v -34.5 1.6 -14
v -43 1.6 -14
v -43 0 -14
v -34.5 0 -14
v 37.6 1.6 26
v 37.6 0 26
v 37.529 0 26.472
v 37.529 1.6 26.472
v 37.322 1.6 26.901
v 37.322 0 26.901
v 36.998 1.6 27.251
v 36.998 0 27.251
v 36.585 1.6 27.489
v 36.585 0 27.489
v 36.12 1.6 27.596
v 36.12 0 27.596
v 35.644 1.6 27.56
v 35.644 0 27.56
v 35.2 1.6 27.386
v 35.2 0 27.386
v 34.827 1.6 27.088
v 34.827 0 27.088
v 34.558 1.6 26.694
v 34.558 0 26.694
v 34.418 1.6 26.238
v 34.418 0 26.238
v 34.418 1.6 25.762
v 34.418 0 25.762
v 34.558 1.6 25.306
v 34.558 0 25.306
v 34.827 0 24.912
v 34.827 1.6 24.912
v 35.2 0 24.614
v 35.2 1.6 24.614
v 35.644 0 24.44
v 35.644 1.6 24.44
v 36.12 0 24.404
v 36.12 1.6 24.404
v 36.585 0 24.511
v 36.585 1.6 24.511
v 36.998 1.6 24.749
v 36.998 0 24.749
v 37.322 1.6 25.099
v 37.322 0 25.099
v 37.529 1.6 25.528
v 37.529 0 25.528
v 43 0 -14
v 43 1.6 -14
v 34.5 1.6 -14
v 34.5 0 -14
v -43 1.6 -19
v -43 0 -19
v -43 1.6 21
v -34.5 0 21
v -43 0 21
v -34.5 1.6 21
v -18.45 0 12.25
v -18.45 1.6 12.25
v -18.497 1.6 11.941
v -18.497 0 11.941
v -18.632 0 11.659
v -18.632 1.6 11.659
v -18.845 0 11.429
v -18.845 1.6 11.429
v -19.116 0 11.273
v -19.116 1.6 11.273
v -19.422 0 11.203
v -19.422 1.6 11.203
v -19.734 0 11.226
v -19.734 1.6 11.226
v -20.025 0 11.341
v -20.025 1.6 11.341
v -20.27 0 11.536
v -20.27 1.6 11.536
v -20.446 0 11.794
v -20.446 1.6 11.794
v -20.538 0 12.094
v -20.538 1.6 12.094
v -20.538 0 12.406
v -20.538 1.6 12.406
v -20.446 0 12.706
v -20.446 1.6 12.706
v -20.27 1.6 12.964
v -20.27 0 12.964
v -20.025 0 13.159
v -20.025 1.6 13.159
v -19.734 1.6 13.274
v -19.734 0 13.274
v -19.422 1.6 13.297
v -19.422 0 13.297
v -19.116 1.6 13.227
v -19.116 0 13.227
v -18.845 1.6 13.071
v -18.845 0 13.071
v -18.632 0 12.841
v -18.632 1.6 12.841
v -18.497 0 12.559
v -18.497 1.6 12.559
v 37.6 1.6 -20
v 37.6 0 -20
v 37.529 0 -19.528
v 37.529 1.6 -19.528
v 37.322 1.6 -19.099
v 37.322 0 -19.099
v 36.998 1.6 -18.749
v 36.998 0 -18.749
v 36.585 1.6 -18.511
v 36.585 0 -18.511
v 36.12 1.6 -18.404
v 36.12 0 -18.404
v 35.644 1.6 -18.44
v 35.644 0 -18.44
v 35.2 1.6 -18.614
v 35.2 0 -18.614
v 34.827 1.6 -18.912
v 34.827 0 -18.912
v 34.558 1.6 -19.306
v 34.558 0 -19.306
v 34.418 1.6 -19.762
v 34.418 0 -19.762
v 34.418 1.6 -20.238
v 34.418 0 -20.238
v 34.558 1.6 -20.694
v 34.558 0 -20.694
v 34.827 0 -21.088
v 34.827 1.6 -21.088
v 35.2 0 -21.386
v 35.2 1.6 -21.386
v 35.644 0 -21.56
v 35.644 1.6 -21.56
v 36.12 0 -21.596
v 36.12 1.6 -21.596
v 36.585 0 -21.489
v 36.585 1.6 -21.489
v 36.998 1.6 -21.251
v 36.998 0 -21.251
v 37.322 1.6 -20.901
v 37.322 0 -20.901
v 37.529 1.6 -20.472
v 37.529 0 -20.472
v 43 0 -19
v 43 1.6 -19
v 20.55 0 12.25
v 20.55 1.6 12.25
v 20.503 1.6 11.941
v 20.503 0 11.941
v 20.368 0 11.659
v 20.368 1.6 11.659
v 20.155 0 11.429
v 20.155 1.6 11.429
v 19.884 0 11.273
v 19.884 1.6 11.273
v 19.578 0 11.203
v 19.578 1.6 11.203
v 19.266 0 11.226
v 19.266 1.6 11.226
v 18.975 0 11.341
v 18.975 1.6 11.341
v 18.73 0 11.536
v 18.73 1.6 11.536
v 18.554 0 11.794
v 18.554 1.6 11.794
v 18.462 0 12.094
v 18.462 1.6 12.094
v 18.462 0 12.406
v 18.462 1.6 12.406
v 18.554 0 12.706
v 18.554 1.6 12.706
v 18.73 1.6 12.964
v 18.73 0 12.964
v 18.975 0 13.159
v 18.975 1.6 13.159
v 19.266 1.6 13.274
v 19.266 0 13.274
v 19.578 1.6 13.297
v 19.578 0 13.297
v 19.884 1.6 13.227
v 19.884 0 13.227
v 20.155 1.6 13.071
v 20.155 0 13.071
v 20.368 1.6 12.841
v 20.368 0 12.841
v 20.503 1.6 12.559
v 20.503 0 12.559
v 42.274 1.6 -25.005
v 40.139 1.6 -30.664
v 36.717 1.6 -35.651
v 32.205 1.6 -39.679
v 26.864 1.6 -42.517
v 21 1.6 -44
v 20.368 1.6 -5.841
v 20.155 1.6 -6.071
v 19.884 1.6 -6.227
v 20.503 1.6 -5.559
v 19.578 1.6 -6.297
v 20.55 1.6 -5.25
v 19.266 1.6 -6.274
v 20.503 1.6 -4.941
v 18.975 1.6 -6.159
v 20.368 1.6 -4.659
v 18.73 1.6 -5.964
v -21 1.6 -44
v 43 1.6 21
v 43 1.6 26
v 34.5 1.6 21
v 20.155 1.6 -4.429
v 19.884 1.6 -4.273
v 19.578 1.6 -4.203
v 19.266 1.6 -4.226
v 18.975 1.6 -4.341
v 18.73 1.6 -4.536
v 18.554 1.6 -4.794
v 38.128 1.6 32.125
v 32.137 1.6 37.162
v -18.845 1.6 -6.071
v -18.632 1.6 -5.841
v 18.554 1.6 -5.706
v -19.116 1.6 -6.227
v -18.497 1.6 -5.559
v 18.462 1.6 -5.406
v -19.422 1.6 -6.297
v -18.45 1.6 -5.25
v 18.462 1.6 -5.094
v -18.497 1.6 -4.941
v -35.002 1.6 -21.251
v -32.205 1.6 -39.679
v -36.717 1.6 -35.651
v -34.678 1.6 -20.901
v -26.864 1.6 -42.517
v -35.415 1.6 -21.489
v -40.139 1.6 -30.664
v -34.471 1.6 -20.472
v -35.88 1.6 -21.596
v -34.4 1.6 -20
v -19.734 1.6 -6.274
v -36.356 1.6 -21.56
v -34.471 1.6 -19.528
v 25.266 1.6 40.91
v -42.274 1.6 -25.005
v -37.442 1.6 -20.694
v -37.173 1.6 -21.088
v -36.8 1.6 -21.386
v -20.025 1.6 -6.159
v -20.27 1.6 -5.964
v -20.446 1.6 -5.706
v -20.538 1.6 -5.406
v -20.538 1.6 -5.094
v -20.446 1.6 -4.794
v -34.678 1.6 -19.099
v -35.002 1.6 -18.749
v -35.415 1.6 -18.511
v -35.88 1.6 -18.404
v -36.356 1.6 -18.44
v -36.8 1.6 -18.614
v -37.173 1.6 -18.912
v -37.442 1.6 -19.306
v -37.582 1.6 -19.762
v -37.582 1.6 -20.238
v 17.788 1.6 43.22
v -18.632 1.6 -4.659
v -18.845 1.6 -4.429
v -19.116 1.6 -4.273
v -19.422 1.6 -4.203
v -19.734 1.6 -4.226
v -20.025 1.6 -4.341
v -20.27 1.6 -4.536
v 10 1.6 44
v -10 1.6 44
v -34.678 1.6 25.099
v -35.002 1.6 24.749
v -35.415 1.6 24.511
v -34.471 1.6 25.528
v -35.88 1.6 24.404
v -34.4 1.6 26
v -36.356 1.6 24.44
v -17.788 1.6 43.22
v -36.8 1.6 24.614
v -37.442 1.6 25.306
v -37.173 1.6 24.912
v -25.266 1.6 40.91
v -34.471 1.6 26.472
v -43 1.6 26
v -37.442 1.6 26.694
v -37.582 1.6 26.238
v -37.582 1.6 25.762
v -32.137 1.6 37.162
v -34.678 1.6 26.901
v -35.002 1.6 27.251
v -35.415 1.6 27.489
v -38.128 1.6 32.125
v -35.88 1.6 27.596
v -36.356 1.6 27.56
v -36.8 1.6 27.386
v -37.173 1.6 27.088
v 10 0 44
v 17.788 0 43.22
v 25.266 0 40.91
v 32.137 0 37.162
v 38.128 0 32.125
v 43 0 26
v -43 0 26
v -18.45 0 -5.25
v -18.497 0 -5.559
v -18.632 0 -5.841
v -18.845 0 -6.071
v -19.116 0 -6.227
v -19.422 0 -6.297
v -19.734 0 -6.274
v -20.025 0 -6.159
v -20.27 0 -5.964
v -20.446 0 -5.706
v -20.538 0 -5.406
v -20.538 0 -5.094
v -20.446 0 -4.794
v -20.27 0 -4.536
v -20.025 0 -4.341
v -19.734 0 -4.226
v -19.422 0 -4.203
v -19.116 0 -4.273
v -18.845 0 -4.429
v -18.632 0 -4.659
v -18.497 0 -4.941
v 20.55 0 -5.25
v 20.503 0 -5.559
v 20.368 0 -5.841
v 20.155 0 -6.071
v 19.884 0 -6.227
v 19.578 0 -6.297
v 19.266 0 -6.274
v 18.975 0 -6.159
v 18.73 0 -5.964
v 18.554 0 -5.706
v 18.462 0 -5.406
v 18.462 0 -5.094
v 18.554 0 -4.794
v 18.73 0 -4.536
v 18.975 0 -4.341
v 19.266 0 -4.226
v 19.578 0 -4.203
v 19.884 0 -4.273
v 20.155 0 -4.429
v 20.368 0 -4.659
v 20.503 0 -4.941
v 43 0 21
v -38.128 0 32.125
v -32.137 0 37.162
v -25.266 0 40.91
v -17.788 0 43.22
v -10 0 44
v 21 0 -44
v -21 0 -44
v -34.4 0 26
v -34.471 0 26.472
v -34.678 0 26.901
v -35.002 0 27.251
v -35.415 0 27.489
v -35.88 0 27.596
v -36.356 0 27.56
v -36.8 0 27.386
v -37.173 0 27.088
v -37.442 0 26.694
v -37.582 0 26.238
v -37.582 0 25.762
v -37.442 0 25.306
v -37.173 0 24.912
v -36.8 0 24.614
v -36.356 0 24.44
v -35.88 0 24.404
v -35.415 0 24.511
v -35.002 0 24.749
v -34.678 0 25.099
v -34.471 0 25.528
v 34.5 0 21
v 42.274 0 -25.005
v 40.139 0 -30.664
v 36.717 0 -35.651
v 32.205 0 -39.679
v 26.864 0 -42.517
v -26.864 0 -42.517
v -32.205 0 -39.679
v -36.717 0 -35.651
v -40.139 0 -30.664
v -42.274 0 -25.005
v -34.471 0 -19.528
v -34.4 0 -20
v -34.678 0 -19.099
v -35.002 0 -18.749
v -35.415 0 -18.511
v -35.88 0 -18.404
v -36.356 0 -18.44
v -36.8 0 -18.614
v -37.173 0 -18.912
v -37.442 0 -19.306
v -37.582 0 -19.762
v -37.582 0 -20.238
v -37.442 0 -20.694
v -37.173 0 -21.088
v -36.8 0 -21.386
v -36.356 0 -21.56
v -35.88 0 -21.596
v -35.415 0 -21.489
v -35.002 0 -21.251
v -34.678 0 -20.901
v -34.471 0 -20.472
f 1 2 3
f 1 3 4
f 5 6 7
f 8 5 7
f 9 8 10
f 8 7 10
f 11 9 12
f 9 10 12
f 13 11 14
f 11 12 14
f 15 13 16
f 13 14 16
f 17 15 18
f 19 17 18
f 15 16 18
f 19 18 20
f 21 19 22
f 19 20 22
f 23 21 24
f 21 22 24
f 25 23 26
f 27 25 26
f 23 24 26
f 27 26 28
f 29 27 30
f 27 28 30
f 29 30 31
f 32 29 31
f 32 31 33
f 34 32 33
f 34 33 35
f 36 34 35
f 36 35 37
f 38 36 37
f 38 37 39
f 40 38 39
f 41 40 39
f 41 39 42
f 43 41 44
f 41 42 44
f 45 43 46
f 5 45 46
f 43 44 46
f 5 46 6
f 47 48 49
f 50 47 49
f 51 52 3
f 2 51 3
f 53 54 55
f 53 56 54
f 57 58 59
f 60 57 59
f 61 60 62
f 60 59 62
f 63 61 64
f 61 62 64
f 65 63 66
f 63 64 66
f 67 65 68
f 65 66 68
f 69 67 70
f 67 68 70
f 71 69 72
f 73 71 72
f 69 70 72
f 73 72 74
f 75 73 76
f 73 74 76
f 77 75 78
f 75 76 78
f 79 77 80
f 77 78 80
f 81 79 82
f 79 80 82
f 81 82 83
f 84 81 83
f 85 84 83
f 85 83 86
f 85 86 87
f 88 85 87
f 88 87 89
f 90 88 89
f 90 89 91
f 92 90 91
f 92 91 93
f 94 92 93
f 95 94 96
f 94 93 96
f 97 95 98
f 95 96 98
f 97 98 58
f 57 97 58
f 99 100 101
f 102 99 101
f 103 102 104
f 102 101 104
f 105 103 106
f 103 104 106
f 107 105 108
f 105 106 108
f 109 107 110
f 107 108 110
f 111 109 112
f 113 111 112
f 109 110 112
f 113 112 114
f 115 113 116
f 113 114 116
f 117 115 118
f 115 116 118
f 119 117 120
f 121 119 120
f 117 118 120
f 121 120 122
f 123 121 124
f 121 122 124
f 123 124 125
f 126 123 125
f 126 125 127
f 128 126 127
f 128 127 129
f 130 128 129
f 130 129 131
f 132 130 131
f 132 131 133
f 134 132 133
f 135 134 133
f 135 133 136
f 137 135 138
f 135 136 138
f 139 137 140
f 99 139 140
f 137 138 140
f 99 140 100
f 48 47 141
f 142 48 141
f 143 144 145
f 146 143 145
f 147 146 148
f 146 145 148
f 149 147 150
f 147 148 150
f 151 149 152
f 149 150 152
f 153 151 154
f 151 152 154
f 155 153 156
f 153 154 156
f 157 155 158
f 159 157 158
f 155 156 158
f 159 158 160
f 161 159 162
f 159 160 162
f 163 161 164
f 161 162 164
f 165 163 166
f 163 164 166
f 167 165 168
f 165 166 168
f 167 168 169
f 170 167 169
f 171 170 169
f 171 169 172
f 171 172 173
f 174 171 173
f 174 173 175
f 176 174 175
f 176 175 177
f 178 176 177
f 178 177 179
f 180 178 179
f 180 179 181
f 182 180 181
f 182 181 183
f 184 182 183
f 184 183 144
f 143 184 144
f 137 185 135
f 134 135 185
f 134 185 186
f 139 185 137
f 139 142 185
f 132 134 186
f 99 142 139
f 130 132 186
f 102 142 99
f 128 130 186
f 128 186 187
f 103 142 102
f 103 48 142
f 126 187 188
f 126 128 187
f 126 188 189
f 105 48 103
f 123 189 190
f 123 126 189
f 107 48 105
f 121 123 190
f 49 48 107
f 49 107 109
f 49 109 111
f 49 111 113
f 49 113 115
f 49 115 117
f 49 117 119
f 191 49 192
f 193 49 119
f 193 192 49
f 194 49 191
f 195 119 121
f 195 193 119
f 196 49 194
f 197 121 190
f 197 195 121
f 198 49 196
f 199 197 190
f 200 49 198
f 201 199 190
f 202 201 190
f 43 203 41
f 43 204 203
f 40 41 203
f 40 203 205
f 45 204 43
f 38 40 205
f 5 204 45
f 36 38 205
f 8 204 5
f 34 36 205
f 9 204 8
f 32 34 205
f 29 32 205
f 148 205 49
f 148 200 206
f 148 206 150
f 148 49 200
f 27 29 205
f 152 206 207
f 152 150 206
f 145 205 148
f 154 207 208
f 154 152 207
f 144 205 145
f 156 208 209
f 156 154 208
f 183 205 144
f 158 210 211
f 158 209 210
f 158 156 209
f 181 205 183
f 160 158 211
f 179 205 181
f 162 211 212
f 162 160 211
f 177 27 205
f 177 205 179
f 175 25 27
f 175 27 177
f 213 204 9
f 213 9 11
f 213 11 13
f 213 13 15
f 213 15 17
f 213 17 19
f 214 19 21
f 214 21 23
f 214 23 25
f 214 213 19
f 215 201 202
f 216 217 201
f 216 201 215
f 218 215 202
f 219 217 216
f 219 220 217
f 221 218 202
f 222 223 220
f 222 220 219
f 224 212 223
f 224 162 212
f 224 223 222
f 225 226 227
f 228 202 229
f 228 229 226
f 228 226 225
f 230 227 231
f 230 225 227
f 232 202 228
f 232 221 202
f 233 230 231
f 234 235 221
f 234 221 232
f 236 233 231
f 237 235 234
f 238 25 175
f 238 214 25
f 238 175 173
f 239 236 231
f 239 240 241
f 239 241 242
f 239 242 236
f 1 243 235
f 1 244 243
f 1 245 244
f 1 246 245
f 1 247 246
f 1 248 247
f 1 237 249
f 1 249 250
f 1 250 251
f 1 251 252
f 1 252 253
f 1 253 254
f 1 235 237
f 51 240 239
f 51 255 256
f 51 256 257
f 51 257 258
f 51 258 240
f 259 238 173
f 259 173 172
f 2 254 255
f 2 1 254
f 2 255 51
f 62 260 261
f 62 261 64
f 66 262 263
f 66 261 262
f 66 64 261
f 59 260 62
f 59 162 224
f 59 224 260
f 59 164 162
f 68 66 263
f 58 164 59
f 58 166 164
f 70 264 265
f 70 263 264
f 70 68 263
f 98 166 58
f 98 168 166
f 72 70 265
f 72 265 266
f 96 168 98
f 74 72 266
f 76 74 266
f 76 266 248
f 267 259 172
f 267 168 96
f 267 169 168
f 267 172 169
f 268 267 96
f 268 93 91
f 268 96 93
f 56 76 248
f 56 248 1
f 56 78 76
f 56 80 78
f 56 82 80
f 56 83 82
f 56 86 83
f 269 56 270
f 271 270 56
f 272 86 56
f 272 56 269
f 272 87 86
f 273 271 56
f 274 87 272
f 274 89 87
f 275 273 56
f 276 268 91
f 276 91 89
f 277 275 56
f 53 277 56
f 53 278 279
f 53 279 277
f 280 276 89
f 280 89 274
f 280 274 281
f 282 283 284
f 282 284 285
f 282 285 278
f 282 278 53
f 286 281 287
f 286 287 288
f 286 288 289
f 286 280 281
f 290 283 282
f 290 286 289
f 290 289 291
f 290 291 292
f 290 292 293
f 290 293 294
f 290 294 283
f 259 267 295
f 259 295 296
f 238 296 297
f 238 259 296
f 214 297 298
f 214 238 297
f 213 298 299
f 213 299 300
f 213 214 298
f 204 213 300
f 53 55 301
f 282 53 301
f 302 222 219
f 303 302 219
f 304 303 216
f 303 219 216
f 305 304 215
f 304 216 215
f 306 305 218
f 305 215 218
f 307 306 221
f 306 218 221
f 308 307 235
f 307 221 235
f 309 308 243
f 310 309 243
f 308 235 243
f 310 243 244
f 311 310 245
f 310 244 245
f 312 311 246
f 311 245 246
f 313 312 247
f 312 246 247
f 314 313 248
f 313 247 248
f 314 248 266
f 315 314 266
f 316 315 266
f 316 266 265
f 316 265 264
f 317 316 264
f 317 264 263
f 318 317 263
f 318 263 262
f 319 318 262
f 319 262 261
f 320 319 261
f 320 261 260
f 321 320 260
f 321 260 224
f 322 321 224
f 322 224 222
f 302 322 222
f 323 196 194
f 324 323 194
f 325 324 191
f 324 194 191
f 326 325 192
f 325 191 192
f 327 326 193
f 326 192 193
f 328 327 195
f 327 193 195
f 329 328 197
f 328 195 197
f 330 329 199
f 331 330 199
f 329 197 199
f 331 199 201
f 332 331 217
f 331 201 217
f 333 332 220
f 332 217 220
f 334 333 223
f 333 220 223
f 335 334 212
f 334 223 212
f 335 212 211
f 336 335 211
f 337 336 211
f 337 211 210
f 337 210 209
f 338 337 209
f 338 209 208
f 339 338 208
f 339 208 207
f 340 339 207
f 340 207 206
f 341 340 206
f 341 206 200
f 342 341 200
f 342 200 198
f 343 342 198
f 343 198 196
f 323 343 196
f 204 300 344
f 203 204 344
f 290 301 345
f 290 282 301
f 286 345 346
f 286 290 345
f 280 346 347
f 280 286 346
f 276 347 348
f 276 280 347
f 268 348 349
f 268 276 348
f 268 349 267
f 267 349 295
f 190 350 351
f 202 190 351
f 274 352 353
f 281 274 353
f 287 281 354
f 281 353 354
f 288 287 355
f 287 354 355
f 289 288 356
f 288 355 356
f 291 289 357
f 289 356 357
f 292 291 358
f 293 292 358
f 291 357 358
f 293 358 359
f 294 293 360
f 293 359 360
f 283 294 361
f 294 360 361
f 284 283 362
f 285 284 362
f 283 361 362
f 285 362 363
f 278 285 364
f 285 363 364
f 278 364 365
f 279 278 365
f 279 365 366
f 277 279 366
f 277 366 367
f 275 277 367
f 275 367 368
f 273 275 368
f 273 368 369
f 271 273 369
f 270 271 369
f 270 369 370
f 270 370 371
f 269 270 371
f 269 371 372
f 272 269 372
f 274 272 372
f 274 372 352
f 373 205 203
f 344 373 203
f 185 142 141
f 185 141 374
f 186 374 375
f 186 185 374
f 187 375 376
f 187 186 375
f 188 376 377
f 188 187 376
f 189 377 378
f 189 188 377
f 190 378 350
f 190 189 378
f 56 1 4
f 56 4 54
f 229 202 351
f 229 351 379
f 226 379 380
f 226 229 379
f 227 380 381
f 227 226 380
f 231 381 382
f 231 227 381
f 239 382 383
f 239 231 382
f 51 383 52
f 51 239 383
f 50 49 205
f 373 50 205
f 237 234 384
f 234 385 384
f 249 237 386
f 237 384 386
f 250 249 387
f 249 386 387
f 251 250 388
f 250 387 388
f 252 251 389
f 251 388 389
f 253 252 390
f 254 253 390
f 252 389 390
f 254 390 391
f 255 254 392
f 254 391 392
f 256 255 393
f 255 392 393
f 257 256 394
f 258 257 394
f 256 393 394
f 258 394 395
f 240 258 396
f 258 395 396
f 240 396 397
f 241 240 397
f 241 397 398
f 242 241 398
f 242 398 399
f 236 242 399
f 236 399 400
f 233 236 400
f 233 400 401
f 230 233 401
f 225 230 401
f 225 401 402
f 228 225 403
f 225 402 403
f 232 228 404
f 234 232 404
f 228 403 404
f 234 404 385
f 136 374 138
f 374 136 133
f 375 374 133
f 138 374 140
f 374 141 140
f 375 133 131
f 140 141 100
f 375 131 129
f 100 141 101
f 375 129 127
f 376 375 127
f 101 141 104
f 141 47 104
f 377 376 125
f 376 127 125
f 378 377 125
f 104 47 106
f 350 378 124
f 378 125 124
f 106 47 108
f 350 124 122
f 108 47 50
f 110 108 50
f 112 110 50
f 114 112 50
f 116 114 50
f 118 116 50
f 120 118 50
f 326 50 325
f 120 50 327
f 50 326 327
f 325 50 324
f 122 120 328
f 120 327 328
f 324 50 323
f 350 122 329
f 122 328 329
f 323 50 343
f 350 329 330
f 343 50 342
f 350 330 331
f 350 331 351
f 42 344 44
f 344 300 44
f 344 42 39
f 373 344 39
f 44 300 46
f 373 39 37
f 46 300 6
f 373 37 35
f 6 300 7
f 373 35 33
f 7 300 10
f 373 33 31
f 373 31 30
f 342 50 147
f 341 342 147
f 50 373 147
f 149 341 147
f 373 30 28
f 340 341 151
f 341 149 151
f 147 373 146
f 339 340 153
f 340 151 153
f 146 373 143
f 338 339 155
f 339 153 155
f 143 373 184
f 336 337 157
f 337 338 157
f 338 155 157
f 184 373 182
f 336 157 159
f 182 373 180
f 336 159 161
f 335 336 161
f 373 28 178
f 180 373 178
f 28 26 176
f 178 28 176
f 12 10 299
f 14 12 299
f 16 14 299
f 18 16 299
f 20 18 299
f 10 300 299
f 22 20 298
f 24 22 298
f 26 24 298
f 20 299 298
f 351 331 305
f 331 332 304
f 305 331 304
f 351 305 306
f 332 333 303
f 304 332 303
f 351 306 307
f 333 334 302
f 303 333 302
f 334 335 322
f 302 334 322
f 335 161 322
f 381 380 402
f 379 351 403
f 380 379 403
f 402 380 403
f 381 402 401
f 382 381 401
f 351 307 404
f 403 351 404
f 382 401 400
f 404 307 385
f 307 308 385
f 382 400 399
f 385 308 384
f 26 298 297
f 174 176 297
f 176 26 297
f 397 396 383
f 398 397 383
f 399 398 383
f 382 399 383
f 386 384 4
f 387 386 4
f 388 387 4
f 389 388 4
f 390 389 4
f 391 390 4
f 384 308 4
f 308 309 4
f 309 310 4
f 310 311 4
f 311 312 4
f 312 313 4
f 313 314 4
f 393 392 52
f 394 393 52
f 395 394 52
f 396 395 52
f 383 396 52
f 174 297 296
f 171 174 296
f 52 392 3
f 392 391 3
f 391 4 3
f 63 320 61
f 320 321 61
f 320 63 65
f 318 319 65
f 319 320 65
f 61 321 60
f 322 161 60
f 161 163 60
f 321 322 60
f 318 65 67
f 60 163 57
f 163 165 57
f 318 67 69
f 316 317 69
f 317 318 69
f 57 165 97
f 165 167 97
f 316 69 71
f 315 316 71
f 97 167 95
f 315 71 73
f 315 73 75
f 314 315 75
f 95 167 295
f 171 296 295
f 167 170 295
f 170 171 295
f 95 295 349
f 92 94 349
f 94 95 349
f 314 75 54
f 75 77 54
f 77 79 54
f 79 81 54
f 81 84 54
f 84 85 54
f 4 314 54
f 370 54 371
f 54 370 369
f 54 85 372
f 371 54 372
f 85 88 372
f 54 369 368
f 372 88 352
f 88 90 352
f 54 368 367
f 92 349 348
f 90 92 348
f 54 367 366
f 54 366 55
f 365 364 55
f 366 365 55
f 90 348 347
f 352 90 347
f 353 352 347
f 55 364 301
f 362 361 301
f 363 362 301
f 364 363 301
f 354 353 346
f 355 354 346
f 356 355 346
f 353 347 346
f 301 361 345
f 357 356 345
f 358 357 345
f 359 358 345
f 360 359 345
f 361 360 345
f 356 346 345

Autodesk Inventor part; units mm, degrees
ref_plane "YZ Plane" through (0, 0, 0) normal (1, 0, 0) x (0, 1, 0)
ref_plane "XZ Plane" through (0, 0, 0) normal (0, 1, 0) x (-1, 0, 0)
ref_plane "XY Plane" through (0, 0, 0) normal (0, 0, 1) x (1, 0, 0)
sketch "Esquisse1" plane through (0, 0, 0) normal (0, 1, 0) x (-1, 0, 0)
  line L0 (-43, -44) -> (43, -44)
  line L1 (43, -44) -> (43, 44)
  line L2 (43, 44) -> (-43, 44)
  line L3 (-43, 44) -> (-43, -44)
  point P0 (0, 0)
  dimension "d0" = 86
  dimension "d1" = 88
  dimension "d2" = 43
  dimension "d3" = 44
extrude "Carre de base" add sketch "Esquisse1" along normal blind 1.6
sketch "Esquisse2" plane through (0, 1.6, 0) normal (0, 1, 0) x (1, 0, 0)
  line L0 (43, 44) -> (-43, 44) projected
  line L1 (-43, 44) -> (-43, -44) projected
  line L2 (-43, -44) -> (43, -44) projected
  line L3 (43, -44) -> (43, 44) projected
  line L4 (-43, 14) -> (-34.5, 14)
  line L5 (-34.5, 14) -> (-34.5, -21)
  line L6 (-34.5, -21) -> (-43, -21)
  line L7 (43, 14) -> (34.5, 14)
  line L8 (34.5, 14) -> (34.5, -21)
  line L9 (34.5, -21) -> (43, -21)
  line L10 (-43, -21) -> (-43, -26)
  line L11 (43, -21) -> (43, -26)
  line L12 (-43, 14) -> (-43, 19)
  line L13 (43, 14) -> (43, 19)
  line L14 (10, -44) -> (-10, -44)
  line L15 (21, 44) -> (-21, 44)
  arc A0 (10, -44) -> (43, -26) centre (10, -4.75) ccw
  arc A1 (-43, -26) -> (-10, -44) centre (-10, -4.75) ccw
  arc A2 (43, 19) -> (21, 44) centre (17.7955, 19) ccw
  arc A3 (-21, 44) -> (-43, 19) centre (-17.7955, 19) ccw
  point P0 (0, 0)
  dimension "d6" = 35
  dimension "d7" = 30
  dimension "d8" = 30
  dimension "d9" = 8.5
  dimension "d10" = 8.5
  dimension "d11" = 35
  dimension "d13" = 5
  dimension "d14" = 5
  dimension "d15" = 5
  dimension "d16" = 5
  dimension "d21" = 20
  dimension "d22" = 10
  dimension "d23" = 42
  dimension "d24" = 21
  dimension "d25" = 39.25
  dimension "d26" = 39.25
  dimension "d27" = 25.2046
  dimension "d28" = 25.2046
extrude "Evidement" cut sketch "Esquisse2" against normal through all contours L3 A2 L0 | A3 L1 L0 | L3 L9 L8 L7 | L4 L5 L6 L1 | L3 L2 A0 | A1 L2 L1
sketch "Esquisse3" plane through (0, 1.6, 0) normal (0, 1, 0) x (1, 0, 0)
  line L0 (34.5, -21) -> (34.5, 14) projected
  line L1 (-34.5, 14) -> (-34.5, -21) projected
  circle A0 centre (-19.5, 5.25) radius 1.05
  circle A1 centre (-19.5, -12.25) radius 1.05
  circle A2 centre (19.5, 5.25) radius 1.05
  circle A3 centre (19.5, -12.25) radius 1.05
  point P0 (0, 0)
  dimension "d31" = 2.1
  dimension "d32" = 17.5
  dimension "d33" = 2.1
  dimension "d34" = 2.1
  dimension "d35" = 2.1
  dimension "d36" = 17.5
  dimension "d37" = 15
  dimension "d38" = 15
  dimension "d39" = 15
  dimension "d40" = 15
  dimension "d41" = 35
  dimension "d42" = 8.75
  dimension "d43" = 8.75
extrude "Extrusion4" cut sketch "Esquisse3" against normal through all
sketch "Esquisse6" plane through (0, 0, 0) normal (0, -1, 0) x (1, 0, 0)
  circle A0 centre (-36, 26) radius 1.6
  circle A1 centre (36, 26) radius 1.6
  circle A2 centre (36, -20) radius 1.6
  circle A3 centre (-36, -20) radius 1.6
  point P0 (0, 0)
  dimension "d59" = 36
  dimension "d60" = 36
  dimension "d61" = 36
  dimension "d62" = 36
  dimension "d63" = 26
  dimension "d64" = 26
  dimension "d65" = 20
  dimension "d66" = 20
  dimension "d67" = 3.2
  dimension "d68" = 3.2
  dimension "d69" = 3.2
  dimension "d70" = 3.2
extrude "Extrusion7" cut sketch "Esquisse6" against normal through all
equation "\"d2\" = 0.5 * d0"
equation "\"d3\" = 0.5 * d1"
equation "\"d8\" = d7"
equation "\"d9\" = d10"
equation "\"d11\" = d6"
equation "\"d13\" = d14"
equation "\"d15\" = d16"
equation "\"d22\" = 0.5 * d21"
equation "\"d24\" = 0.5 * d23"
equation "\"d26\" = d25"
equation "\"d28\" = d27"
equation "\"d33\" = d31"
equation "\"d34\" = d31"
equation "\"d35\" = d31"
equation "\"d36\" = d32"
equation "\"d38\" = d37"
equation "\"d39\" = d37"
equation "\"d40\" = d37"
equation "\"d42\" = -0.5 * d36 + 0.5 * d41"
equation "\"d43\" = d42"
equation "\"d60\" = d59"
equation "\"d61\" = d59"
equation "\"d62\" = d59"
equation "\"d64\" = d63"
equation "\"d66\" = d65"
equation "\"d68\" = d67"
equation "\"d69\" = d67"
equation "\"d70\" = d67"
properties part number "pcb"
